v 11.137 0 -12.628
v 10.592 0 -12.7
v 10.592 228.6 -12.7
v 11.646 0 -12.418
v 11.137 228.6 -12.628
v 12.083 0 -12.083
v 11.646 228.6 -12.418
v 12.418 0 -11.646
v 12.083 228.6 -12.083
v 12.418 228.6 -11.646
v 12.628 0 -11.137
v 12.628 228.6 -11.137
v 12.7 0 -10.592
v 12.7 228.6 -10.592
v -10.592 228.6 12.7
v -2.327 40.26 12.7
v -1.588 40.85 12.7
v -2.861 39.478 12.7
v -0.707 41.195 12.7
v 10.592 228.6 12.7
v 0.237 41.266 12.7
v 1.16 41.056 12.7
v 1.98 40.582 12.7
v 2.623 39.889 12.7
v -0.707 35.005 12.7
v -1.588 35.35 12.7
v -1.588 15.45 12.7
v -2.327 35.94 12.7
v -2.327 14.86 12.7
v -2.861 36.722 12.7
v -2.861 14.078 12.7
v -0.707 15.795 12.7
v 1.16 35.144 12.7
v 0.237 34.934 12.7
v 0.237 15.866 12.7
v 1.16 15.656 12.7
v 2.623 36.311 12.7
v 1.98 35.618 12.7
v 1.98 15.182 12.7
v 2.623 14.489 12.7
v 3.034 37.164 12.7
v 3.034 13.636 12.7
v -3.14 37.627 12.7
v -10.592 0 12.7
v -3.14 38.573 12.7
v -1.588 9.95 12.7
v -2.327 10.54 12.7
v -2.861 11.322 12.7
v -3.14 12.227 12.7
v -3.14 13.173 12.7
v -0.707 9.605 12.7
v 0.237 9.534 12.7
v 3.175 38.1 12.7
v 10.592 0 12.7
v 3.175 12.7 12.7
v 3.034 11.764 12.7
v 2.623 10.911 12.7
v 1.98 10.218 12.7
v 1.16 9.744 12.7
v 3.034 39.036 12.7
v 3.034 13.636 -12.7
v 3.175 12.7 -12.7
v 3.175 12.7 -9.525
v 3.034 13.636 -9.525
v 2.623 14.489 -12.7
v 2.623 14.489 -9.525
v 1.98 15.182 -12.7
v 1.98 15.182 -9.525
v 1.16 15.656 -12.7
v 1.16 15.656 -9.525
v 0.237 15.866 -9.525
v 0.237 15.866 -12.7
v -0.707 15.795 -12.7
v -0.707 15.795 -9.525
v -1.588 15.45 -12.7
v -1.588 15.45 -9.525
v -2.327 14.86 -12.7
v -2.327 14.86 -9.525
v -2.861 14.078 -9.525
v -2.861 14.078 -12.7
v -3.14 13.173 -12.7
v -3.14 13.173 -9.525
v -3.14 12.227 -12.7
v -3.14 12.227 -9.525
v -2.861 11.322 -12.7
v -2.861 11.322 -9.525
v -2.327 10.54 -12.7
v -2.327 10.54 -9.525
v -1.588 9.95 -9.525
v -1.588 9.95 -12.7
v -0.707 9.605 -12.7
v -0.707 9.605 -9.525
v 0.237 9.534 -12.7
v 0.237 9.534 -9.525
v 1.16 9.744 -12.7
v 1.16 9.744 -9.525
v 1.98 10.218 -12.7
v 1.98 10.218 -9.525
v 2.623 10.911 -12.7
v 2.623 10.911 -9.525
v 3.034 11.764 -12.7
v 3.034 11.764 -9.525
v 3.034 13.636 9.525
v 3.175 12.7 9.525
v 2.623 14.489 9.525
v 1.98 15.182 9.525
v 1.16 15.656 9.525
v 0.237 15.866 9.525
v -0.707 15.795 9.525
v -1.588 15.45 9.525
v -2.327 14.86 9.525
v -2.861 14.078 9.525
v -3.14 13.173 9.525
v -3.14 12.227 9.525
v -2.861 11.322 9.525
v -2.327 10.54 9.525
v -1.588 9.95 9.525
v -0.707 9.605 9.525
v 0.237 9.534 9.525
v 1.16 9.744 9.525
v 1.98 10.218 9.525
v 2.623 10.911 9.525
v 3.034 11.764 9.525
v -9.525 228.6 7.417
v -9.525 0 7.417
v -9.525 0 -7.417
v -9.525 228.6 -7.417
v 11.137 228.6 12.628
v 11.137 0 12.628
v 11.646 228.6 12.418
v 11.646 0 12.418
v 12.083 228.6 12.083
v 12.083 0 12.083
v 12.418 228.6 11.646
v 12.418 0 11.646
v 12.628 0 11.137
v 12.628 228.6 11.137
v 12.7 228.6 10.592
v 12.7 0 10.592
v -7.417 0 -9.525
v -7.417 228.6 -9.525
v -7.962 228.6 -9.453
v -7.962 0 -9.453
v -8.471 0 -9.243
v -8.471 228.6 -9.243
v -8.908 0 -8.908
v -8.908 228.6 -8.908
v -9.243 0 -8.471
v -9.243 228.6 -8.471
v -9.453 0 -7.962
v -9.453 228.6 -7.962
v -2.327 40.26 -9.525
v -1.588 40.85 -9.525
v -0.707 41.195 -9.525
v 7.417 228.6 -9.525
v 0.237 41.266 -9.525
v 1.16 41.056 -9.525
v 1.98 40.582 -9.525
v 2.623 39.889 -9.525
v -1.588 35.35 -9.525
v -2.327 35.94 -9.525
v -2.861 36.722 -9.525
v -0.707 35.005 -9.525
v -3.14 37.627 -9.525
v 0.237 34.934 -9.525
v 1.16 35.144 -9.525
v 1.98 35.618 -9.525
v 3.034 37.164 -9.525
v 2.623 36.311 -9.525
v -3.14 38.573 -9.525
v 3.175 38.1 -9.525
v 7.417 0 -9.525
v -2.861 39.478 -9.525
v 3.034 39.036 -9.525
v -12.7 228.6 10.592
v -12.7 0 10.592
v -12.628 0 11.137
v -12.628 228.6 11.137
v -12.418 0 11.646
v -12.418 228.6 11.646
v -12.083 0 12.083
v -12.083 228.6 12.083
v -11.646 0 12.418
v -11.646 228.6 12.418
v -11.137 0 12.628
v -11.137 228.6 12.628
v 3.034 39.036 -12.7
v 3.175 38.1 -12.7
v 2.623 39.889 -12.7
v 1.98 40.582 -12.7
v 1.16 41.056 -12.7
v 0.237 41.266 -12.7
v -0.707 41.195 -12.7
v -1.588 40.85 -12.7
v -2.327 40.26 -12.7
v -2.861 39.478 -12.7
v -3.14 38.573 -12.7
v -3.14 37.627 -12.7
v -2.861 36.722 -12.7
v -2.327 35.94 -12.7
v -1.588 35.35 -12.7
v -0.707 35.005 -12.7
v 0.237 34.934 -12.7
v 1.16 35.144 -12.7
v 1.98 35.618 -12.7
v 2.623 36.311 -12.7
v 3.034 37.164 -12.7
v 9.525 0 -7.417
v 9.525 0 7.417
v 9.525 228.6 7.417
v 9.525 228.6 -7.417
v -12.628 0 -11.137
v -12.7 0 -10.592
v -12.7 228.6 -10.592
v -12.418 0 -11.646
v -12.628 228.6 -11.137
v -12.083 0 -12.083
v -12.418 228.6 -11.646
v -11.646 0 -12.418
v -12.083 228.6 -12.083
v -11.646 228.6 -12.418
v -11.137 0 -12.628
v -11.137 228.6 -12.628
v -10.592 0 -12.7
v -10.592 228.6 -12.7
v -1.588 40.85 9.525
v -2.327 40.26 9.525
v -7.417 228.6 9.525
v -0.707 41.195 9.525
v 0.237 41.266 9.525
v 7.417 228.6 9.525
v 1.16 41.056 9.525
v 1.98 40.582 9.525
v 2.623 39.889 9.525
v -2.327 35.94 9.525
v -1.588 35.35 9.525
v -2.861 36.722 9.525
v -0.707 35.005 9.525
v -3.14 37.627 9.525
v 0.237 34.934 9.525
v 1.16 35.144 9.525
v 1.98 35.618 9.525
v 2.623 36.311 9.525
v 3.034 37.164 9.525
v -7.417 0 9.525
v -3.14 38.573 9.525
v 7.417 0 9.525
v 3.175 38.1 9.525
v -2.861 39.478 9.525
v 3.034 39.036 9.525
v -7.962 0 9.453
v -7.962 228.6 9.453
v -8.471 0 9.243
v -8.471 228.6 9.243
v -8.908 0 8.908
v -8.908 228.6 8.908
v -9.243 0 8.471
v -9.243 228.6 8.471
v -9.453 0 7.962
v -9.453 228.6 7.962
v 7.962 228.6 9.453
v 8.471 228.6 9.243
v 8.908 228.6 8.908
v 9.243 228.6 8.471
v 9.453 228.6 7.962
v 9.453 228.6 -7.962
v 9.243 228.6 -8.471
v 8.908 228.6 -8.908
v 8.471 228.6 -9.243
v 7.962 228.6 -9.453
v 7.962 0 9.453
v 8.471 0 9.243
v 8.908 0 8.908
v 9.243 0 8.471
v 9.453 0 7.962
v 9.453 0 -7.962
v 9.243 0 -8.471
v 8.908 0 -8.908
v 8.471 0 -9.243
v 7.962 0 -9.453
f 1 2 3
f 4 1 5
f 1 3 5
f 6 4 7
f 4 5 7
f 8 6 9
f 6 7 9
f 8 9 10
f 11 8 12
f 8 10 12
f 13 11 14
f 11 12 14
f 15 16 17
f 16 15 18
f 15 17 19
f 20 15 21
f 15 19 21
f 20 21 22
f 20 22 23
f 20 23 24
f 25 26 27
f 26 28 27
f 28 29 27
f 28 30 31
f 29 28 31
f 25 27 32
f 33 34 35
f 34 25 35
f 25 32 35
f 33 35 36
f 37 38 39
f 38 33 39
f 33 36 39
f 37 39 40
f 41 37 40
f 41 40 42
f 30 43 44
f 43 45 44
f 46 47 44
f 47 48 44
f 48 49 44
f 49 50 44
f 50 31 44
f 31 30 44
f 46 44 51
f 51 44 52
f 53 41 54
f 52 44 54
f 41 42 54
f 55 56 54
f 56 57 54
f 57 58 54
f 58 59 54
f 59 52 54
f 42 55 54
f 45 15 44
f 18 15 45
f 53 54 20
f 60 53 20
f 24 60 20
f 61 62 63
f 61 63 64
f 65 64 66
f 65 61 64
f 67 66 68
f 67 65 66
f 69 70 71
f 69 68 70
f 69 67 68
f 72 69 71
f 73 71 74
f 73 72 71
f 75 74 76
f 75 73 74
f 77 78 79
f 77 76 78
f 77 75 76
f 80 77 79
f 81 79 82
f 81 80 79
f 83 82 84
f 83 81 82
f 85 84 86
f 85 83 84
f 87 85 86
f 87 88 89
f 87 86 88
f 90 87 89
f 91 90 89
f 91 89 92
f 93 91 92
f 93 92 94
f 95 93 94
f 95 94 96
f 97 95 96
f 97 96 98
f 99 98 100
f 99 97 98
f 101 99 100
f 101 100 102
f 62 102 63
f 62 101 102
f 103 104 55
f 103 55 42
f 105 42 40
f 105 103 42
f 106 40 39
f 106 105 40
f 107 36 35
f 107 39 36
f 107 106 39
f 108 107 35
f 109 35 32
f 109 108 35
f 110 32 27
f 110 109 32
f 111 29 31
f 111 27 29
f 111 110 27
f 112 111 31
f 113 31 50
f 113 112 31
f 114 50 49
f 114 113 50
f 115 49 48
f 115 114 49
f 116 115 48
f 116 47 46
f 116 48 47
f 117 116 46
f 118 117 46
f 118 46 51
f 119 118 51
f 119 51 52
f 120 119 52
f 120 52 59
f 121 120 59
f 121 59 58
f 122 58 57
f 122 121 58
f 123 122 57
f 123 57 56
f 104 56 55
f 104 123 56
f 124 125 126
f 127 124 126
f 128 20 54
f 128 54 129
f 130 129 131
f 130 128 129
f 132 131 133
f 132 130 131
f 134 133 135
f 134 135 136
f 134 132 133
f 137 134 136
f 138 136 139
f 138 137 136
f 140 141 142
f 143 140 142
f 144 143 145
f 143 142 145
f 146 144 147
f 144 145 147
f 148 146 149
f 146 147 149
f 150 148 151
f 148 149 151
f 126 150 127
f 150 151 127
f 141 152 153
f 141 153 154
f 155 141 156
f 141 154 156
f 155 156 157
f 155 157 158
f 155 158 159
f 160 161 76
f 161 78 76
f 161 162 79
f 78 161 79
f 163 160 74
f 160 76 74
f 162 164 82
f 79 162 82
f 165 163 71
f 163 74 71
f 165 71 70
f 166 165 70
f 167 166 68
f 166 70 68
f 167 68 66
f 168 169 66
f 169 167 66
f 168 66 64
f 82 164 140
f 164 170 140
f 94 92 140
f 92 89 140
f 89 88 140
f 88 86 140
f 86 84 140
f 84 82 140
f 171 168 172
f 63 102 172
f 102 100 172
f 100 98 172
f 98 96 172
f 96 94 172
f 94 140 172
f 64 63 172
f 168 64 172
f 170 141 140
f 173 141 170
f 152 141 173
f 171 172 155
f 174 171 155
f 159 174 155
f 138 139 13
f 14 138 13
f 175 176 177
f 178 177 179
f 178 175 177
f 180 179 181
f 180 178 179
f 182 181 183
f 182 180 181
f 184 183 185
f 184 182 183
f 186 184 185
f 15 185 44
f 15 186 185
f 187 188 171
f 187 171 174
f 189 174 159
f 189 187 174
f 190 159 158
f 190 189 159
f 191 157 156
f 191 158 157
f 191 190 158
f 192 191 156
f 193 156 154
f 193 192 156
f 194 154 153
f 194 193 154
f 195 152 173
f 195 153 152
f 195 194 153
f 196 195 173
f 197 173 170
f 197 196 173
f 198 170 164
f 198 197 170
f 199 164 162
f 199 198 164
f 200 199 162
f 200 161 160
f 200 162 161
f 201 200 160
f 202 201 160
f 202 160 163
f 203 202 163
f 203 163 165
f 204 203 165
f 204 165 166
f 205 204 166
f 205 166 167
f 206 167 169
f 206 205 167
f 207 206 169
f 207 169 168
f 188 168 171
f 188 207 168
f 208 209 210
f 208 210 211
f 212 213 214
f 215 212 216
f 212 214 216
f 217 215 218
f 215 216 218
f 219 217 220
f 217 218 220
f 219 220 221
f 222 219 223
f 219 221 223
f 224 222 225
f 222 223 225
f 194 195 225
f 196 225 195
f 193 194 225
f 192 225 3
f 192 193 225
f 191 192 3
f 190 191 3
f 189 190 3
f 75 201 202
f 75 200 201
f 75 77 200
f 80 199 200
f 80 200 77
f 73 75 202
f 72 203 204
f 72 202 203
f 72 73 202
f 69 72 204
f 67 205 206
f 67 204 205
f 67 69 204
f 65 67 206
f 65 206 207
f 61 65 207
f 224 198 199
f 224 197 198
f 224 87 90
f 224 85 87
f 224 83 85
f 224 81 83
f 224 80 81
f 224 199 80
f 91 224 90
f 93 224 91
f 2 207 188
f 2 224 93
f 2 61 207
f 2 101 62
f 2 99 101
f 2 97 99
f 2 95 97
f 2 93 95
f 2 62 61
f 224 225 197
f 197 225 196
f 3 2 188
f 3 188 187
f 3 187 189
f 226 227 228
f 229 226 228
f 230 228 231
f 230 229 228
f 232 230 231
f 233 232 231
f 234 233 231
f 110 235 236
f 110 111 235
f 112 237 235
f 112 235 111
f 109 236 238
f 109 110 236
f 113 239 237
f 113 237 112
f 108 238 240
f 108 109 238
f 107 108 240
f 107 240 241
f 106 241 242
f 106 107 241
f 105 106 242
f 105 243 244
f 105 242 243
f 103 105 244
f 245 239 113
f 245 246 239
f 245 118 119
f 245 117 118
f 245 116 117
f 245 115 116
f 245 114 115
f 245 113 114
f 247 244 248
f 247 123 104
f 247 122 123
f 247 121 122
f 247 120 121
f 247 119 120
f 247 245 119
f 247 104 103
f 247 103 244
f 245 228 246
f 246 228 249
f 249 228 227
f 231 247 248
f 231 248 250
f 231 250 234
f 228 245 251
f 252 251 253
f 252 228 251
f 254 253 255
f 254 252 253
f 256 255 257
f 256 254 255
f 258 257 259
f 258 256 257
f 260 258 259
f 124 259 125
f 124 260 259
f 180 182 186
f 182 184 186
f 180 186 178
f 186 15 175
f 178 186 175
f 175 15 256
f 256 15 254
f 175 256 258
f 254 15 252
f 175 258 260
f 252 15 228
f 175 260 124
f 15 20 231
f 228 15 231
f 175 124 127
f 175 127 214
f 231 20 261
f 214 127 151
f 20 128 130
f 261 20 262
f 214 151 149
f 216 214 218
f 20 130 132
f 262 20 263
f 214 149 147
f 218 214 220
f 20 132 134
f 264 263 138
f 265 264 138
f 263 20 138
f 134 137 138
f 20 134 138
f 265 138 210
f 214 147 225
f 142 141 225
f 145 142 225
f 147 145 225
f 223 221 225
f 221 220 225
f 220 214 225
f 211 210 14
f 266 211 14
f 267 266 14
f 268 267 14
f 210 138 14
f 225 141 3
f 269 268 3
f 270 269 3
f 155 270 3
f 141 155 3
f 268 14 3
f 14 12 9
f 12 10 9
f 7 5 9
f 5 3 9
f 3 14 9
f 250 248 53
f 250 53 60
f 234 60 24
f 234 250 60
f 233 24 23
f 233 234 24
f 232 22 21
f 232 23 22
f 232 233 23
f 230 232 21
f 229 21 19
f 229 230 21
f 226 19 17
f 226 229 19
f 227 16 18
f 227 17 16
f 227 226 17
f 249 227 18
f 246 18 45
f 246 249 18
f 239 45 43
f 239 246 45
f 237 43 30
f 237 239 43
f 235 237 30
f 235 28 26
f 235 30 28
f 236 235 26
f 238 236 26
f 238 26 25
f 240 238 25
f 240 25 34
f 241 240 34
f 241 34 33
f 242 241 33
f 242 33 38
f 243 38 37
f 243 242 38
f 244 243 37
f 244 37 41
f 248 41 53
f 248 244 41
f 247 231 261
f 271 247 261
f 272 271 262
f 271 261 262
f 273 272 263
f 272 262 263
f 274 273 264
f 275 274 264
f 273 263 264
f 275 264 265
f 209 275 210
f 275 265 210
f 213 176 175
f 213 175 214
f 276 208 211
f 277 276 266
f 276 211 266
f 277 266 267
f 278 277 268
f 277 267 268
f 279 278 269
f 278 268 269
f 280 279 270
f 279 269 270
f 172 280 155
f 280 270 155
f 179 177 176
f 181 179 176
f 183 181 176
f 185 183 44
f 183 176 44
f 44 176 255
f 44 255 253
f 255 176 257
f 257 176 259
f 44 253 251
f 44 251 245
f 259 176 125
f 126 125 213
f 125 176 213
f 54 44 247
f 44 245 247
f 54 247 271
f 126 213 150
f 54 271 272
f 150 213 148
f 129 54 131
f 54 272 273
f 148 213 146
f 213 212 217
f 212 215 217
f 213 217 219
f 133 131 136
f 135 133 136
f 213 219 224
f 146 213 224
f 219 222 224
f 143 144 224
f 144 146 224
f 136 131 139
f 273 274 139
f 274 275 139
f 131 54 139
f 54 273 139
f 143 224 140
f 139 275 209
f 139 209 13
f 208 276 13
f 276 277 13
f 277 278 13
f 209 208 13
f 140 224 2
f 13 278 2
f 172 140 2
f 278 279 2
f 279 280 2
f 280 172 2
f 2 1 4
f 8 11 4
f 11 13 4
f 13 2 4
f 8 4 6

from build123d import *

# Parameters (mm, degrees)
SKETCH1_W               = 25.4
SKETCH1_H               = 25.4
SKETCH1_W_2             = 19.05
SKETCH1_H_2             = 19.05
BOSS_EXTRUDE1_DEPTH     = 1219.2
FILLET1_R               = 2.1082
SKETCH2_OUTSIDE_W       = 271.346
SKETCH2_OUTSIDE_H       = 1465.146
SKETCH2_OUTSIDE_W_2     = 161.404490431
SKETCH2_OUTSIDE_H_2     = 228.6
CUT_EXTRUDE1_DEPTH      = 1220.530684321
CUT_EXTRUDE3_DEPTH      = 231.35713577
CUT_EXTRUDE3_DEPTH_BACK = 231.35713577
SKETCH5_R               = 3.175


with BuildPart() as part:
    # Sketch1 → Boss-Extrude1 (new body)
    with BuildSketch(Plane(origin=(0, 0, 0), x_dir=(1, 0, 0), z_dir=(0, 1, 0))):
        Rectangle(SKETCH1_W, SKETCH1_H)
        Rectangle(SKETCH1_W_2, SKETCH1_H_2, mode=Mode.SUBTRACT)
    extrude(amount=BOSS_EXTRUDE1_DEPTH)

    # Fillet1
    fillet1_edges = [part.edges().sort_by_distance(p)[0] for p in [
        (9.525, 609.6, 9.525),
        (9.525, 609.6, -9.525),
        (-9.525, 609.6, -9.525),
        (-9.525, 609.6, 9.525),
        (-12.7, 609.6, -12.7),
        (12.7, 609.6, -12.7),
        (12.7, 609.6, 12.7),
        (-12.7, 609.6, 12.7),
    ]]
    fillet(fillet1_edges, radius=FILLET1_R)

    # Sketch2 outside → Cut-Extrude1 (cut, through all)
    with BuildSketch(Plane(origin=(12.7, 0, 0), x_dir=(0, 0, -1), z_dir=(1, 0, 0))):
        with Locations((0, 609.6)):
            Rectangle(SKETCH2_OUTSIDE_W, SKETCH2_OUTSIDE_H)
        with Locations((42.327264621, 114.3)):
            Rectangle(SKETCH2_OUTSIDE_W_2, SKETCH2_OUTSIDE_H_2, mode=Mode.SUBTRACT)
    extrude(amount=-CUT_EXTRUDE1_DEPTH, mode=Mode.SUBTRACT)

    # Sketch5 → Cut-Extrude3 (cut, two sides: drawn at the far end of the back side and taken through both)
    with BuildSketch(Plane.XY.offset(12.7).offset(-CUT_EXTRUDE3_DEPTH_BACK)):
        with Locations((0, 12.7)):
            Circle(SKETCH5_R)
        with Locations((0, 38.1)):
            Circle(SKETCH5_R)
    extrude(amount=CUT_EXTRUDE3_DEPTH + CUT_EXTRUDE3_DEPTH_BACK, mode=Mode.SUBTRACT)


solid = part.part
